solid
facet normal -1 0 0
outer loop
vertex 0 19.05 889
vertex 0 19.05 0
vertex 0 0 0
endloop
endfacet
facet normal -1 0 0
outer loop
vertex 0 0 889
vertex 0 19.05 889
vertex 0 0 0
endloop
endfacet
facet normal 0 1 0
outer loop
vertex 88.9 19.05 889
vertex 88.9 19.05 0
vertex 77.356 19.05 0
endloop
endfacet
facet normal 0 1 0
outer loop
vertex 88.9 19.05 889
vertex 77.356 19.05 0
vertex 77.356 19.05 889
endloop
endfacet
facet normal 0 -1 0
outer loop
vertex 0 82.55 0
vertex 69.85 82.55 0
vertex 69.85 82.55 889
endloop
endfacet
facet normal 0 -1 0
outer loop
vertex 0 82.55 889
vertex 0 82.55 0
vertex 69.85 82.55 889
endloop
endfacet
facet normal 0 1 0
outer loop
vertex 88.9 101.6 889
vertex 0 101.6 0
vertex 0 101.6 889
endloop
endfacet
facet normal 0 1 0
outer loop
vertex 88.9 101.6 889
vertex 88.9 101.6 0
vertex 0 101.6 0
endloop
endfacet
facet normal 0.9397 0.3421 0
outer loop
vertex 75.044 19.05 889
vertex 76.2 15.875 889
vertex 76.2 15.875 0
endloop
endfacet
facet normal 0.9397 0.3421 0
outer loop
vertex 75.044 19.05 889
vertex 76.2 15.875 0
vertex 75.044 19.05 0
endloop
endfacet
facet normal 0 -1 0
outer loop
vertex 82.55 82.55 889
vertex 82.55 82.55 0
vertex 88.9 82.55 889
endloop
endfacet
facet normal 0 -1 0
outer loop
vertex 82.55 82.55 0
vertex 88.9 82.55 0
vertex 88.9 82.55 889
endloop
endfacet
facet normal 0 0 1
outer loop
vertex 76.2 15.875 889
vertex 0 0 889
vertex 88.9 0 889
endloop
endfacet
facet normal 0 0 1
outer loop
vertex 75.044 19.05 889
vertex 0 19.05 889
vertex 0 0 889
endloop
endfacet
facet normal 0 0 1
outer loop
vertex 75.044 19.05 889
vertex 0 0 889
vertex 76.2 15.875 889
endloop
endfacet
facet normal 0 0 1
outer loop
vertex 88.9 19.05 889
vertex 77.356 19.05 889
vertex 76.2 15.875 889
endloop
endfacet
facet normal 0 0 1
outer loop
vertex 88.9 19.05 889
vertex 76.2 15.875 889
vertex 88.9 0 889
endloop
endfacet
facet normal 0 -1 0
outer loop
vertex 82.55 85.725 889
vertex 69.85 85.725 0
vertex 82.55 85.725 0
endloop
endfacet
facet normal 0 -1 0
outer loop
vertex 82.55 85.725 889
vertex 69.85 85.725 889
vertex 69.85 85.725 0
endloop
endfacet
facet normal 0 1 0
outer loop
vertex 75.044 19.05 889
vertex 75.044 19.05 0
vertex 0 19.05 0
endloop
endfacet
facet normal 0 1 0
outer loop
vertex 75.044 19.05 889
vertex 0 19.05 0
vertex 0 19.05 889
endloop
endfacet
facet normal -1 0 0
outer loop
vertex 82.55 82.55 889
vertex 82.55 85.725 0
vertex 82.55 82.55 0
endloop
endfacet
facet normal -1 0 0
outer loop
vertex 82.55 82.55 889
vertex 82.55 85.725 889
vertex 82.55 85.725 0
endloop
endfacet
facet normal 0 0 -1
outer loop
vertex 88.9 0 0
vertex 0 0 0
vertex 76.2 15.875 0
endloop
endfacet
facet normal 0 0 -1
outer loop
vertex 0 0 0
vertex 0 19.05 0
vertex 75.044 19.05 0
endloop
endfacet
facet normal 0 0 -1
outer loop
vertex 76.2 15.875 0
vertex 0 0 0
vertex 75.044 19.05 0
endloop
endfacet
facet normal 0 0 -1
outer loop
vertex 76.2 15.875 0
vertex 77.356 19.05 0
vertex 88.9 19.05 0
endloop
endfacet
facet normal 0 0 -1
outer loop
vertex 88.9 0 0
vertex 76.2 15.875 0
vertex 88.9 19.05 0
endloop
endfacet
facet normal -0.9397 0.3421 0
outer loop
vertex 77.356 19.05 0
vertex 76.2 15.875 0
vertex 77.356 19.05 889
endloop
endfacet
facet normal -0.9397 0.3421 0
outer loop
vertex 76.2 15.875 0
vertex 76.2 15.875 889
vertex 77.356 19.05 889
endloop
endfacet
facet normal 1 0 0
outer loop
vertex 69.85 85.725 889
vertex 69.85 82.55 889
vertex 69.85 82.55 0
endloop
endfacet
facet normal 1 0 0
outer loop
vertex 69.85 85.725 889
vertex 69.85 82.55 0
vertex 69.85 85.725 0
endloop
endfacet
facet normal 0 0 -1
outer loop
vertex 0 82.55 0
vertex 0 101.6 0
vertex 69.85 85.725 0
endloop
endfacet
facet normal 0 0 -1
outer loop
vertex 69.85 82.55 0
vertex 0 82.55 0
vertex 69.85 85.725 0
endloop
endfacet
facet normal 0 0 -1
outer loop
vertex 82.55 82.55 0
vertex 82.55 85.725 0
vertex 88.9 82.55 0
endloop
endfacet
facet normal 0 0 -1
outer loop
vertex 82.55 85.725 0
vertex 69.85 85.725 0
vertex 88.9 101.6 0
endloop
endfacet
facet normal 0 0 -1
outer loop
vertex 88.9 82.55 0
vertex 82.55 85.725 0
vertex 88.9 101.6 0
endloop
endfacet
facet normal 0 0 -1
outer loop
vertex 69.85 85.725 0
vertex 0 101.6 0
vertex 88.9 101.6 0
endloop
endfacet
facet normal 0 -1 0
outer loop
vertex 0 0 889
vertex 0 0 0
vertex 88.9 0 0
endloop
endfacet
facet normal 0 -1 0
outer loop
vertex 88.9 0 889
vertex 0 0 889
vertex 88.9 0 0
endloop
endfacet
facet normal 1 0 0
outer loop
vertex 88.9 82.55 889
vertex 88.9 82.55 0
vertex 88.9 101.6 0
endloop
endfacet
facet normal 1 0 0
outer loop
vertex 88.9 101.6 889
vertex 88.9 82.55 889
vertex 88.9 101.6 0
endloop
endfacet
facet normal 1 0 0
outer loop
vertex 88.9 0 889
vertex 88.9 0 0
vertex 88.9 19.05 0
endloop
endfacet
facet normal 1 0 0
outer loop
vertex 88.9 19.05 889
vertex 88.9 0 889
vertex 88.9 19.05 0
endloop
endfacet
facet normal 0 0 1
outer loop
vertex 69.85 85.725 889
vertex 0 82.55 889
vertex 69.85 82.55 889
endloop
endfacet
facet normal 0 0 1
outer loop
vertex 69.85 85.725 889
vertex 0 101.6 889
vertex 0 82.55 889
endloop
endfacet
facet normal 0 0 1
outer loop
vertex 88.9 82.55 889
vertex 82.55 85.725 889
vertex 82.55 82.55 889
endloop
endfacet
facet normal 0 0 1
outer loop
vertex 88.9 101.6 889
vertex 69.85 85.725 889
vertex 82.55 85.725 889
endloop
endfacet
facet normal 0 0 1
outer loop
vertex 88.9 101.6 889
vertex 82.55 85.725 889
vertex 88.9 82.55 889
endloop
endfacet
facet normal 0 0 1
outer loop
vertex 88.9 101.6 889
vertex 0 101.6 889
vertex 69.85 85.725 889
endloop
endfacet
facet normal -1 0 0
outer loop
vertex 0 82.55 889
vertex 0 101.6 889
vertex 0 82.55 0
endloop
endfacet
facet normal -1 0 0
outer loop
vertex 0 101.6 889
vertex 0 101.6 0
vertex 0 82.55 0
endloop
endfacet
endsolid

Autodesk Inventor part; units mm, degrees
ref_plane "YZ Plane" through (0, 0, 0) normal (1, 0, 0) x (0, 1, 0)
ref_plane "XZ Plane" through (0, 0, 0) normal (0, 1, 0) x (-1, 0, 0)
ref_plane "XY Plane" through (0, 0, 0) normal (0, 0, 1) x (1, 0, 0)
sketch "Sketch1" plane through (0, 0, 0) normal (0, 0, 1) x (1, 0, 0)
  line L0 (0, 0) -> (88.9, 0)
  line L1 (88.9, 0) -> (88.9, 19.05)
  line L2 (88.9, 19.05) -> (0, 19.05)
  line L3 (0, 19.05) -> (0, 0)
  dimension "d0" = 88.9
  dimension "d1" = 19.05
extrude "Extrusion1" add sketch "Sketch1" along normal blind 889
sketch "Sketch2" plane through (0, 19.05, 0) normal (0, 1, 0) x (1, 0, 0)
  line L0 (88.9, 0) -> (0, 0) projected
  line L1 (0, 0) -> (0, -889) projected
  line L2 (88.9, -889) -> (0, -889) projected
  line L3 (88.9, 0) -> (88.9, -889) projected
extrude "Extrusion2" add sketch "Sketch2" along normal blind 127
sketch "Sketch3" plane through (88.9, 0, 889) normal (1, 0, 0) x (0, 0, -1)
  line L0 (889, 0) -> (889, 146.05) projected
  line L1 (0, 146.05) -> (889, 146.05) projected
  line L2 (0, 0) -> (0, 146.05) projected
  line L3 (889, 0) -> (0, 0) projected
  line L4 (889, 0) -> (0, 0) projected
  line L5 (889, 0) -> (889, 146.05) projected
  line L6 (0, 0) -> (889, 0)
  line L7 (889, 0) -> (889, 19.05)
  line L8 (889, 19.05) -> (0, 19.05)
  line L9 (0, 19.05) -> (0, 0)
  line L10 (0, 0) -> (0, 146.05) projected
  line L11 (889, 0) -> (889, 146.05) projected
  line L12 (0, 0) -> (889, 0)
  line L13 (889, 0) -> (889, 101.6)
  line L14 (889, 101.6) -> (0, 101.6)
  line L15 (0, 101.6) -> (0, 0)
  line L16 (0, 101.6) -> (889, 101.6)
  line L17 (889, 101.6) -> (889, 82.55)
  line L18 (889, 82.55) -> (0, 82.55)
  line L19 (0, 82.55) -> (0, 101.6)
  dimension "d6" = 19.05
  dimension "d7" = 889
  dimension "d8" = 101.6
  dimension "d9" = 19.05
extrude "Extrusion3" cut sketch "Sketch3" against normal blind 127 contours L8 L2 L18 L0 | L14 L2 L1 L0
sketch "Sketch5" plane through (0, 0, 889) normal (0, 0, 1) x (1, 0, 0)
  line L0 (0, 0) -> (0, 19.05) projected
  line L1 (88.9, 82.55) -> (88.9, 101.6) projected
  line L2 (0, 0) -> (88.9, 0)
  line L3 (88.9, 0) -> (88.9, 101.6)
  line L4 (88.9, 101.6) -> (0, 101.6)
  line L5 (0, 101.6) -> (0, 0)
  line L6 (88.9, 19.05) -> (0, 19.05) projected
  line L7 (0, 82.55) -> (88.9, 82.55) projected
  line L8 (88.9, 82.55) -> (82.55, 82.55)
  line L9 (82.55, 82.55) -> (82.55, 74.8219)
  line L10 (82.55, 74.8219) -> (88.9, 74.8219)
  line L11 (88.9, 74.8219) -> (88.9, 82.55)
  line L12 (82.55, 82.55) -> (69.85, 82.55)
  line L13 (69.85, 82.55) -> (69.85, 85.725)
  line L14 (69.85, 85.725) -> (82.55, 85.725)
  line L15 (82.55, 85.725) -> (82.55, 82.55)
  dimension "d12" = 88.9
  dimension "d13" = 101.6
  dimension "d14" = 19.05
  dimension "d15" = 63.5
  dimension "d16" = 6.35
  dimension "d17" = 12.7
  dimension "d18" = 3.175
extrude "Extrusion4" cut sketch "Sketch5" against normal through all contours L13 L14 L15 L7
sketch "Sketch6" plane through (0, 0, 889) normal (0, 0, 1) x (1, 0, 0)
  line L0 (0, 0) -> (0, 19.05)
  line L1 (88.9, 82.55) -> (88.9, 101.6)
  line L2 (0, 0) -> (88.9, 0)
  line L3 (88.9, 0) -> (88.9, 101.6)
  line L4 (88.9, 101.6) -> (0, 101.6)
  line L5 (0, 101.6) -> (0, 0)
  line L6 (88.9, 19.05) -> (0, 19.05)
  line L7 (0, 82.55) -> (88.9, 82.55)
  line L8 (88.9, 82.55) -> (82.55, 82.55)
  line L9 (82.55, 82.55) -> (82.55, 74.8219)
  line L10 (82.55, 74.8219) -> (88.9, 74.8219)
  line L11 (88.9, 74.8219) -> (88.9, 82.55)
  line L12 (82.55, 82.55) -> (69.85, 82.55)
  line L13 (69.85, 82.55) -> (69.85, 85.725)
  line L14 (69.85, 85.725) -> (82.55, 85.725)
  line L15 (82.55, 85.725) -> (82.55, 82.55)
  line L16 (76.2, 82.55) -> (76.2, 19.05)
  line L17 (88.9, 19.05) -> (0, 19.05) projected
  line L18 (76.2, 19.05) -> (76.2, 15.875)
  line L19 (76.2, 15.875) -> (72.9644, 24.7648)
  line L20 (76.2, 15.875) -> (79.0952, 23.8296)
  point P0 (75.0444, 19.05)
  point P1 (77.3556, 19.05)
  dimension "d21" = 88.9
  dimension "d22" = 101.6
  dimension "d23" = 19.05
  dimension "d24" = 63.5
  dimension "d25" = 6.35
  dimension "d26" = 12.7
  dimension "d27" = 3.175
  dimension "d28" = 3.175
  dimension "d29" = 20
  dimension "d30" = 20
extrude "Extrusion5" cut sketch "Sketch6" against normal through all contours L6 L18 L19 | L6 L20 L18
sketch "Sketch8" plane through (88.9, 82.55, 889) normal (1, 0, 0) x (0, 0, -1)
  line L0 (889, 19.05) -> (0, 19.05) projected
  line L1 (889, -82.55) -> (0, -82.55) projected
  line L2 (0, 19.05) -> (19.05, 19.05)
  line L3 (19.05, 19.05) -> (19.05, -82.55)
  line L4 (19.05, -82.55) -> (0, -82.55)
  line L5 (0, -82.55) -> (0, 19.05)
  dimension "d40" = 19.05
properties part number "box slabs"
